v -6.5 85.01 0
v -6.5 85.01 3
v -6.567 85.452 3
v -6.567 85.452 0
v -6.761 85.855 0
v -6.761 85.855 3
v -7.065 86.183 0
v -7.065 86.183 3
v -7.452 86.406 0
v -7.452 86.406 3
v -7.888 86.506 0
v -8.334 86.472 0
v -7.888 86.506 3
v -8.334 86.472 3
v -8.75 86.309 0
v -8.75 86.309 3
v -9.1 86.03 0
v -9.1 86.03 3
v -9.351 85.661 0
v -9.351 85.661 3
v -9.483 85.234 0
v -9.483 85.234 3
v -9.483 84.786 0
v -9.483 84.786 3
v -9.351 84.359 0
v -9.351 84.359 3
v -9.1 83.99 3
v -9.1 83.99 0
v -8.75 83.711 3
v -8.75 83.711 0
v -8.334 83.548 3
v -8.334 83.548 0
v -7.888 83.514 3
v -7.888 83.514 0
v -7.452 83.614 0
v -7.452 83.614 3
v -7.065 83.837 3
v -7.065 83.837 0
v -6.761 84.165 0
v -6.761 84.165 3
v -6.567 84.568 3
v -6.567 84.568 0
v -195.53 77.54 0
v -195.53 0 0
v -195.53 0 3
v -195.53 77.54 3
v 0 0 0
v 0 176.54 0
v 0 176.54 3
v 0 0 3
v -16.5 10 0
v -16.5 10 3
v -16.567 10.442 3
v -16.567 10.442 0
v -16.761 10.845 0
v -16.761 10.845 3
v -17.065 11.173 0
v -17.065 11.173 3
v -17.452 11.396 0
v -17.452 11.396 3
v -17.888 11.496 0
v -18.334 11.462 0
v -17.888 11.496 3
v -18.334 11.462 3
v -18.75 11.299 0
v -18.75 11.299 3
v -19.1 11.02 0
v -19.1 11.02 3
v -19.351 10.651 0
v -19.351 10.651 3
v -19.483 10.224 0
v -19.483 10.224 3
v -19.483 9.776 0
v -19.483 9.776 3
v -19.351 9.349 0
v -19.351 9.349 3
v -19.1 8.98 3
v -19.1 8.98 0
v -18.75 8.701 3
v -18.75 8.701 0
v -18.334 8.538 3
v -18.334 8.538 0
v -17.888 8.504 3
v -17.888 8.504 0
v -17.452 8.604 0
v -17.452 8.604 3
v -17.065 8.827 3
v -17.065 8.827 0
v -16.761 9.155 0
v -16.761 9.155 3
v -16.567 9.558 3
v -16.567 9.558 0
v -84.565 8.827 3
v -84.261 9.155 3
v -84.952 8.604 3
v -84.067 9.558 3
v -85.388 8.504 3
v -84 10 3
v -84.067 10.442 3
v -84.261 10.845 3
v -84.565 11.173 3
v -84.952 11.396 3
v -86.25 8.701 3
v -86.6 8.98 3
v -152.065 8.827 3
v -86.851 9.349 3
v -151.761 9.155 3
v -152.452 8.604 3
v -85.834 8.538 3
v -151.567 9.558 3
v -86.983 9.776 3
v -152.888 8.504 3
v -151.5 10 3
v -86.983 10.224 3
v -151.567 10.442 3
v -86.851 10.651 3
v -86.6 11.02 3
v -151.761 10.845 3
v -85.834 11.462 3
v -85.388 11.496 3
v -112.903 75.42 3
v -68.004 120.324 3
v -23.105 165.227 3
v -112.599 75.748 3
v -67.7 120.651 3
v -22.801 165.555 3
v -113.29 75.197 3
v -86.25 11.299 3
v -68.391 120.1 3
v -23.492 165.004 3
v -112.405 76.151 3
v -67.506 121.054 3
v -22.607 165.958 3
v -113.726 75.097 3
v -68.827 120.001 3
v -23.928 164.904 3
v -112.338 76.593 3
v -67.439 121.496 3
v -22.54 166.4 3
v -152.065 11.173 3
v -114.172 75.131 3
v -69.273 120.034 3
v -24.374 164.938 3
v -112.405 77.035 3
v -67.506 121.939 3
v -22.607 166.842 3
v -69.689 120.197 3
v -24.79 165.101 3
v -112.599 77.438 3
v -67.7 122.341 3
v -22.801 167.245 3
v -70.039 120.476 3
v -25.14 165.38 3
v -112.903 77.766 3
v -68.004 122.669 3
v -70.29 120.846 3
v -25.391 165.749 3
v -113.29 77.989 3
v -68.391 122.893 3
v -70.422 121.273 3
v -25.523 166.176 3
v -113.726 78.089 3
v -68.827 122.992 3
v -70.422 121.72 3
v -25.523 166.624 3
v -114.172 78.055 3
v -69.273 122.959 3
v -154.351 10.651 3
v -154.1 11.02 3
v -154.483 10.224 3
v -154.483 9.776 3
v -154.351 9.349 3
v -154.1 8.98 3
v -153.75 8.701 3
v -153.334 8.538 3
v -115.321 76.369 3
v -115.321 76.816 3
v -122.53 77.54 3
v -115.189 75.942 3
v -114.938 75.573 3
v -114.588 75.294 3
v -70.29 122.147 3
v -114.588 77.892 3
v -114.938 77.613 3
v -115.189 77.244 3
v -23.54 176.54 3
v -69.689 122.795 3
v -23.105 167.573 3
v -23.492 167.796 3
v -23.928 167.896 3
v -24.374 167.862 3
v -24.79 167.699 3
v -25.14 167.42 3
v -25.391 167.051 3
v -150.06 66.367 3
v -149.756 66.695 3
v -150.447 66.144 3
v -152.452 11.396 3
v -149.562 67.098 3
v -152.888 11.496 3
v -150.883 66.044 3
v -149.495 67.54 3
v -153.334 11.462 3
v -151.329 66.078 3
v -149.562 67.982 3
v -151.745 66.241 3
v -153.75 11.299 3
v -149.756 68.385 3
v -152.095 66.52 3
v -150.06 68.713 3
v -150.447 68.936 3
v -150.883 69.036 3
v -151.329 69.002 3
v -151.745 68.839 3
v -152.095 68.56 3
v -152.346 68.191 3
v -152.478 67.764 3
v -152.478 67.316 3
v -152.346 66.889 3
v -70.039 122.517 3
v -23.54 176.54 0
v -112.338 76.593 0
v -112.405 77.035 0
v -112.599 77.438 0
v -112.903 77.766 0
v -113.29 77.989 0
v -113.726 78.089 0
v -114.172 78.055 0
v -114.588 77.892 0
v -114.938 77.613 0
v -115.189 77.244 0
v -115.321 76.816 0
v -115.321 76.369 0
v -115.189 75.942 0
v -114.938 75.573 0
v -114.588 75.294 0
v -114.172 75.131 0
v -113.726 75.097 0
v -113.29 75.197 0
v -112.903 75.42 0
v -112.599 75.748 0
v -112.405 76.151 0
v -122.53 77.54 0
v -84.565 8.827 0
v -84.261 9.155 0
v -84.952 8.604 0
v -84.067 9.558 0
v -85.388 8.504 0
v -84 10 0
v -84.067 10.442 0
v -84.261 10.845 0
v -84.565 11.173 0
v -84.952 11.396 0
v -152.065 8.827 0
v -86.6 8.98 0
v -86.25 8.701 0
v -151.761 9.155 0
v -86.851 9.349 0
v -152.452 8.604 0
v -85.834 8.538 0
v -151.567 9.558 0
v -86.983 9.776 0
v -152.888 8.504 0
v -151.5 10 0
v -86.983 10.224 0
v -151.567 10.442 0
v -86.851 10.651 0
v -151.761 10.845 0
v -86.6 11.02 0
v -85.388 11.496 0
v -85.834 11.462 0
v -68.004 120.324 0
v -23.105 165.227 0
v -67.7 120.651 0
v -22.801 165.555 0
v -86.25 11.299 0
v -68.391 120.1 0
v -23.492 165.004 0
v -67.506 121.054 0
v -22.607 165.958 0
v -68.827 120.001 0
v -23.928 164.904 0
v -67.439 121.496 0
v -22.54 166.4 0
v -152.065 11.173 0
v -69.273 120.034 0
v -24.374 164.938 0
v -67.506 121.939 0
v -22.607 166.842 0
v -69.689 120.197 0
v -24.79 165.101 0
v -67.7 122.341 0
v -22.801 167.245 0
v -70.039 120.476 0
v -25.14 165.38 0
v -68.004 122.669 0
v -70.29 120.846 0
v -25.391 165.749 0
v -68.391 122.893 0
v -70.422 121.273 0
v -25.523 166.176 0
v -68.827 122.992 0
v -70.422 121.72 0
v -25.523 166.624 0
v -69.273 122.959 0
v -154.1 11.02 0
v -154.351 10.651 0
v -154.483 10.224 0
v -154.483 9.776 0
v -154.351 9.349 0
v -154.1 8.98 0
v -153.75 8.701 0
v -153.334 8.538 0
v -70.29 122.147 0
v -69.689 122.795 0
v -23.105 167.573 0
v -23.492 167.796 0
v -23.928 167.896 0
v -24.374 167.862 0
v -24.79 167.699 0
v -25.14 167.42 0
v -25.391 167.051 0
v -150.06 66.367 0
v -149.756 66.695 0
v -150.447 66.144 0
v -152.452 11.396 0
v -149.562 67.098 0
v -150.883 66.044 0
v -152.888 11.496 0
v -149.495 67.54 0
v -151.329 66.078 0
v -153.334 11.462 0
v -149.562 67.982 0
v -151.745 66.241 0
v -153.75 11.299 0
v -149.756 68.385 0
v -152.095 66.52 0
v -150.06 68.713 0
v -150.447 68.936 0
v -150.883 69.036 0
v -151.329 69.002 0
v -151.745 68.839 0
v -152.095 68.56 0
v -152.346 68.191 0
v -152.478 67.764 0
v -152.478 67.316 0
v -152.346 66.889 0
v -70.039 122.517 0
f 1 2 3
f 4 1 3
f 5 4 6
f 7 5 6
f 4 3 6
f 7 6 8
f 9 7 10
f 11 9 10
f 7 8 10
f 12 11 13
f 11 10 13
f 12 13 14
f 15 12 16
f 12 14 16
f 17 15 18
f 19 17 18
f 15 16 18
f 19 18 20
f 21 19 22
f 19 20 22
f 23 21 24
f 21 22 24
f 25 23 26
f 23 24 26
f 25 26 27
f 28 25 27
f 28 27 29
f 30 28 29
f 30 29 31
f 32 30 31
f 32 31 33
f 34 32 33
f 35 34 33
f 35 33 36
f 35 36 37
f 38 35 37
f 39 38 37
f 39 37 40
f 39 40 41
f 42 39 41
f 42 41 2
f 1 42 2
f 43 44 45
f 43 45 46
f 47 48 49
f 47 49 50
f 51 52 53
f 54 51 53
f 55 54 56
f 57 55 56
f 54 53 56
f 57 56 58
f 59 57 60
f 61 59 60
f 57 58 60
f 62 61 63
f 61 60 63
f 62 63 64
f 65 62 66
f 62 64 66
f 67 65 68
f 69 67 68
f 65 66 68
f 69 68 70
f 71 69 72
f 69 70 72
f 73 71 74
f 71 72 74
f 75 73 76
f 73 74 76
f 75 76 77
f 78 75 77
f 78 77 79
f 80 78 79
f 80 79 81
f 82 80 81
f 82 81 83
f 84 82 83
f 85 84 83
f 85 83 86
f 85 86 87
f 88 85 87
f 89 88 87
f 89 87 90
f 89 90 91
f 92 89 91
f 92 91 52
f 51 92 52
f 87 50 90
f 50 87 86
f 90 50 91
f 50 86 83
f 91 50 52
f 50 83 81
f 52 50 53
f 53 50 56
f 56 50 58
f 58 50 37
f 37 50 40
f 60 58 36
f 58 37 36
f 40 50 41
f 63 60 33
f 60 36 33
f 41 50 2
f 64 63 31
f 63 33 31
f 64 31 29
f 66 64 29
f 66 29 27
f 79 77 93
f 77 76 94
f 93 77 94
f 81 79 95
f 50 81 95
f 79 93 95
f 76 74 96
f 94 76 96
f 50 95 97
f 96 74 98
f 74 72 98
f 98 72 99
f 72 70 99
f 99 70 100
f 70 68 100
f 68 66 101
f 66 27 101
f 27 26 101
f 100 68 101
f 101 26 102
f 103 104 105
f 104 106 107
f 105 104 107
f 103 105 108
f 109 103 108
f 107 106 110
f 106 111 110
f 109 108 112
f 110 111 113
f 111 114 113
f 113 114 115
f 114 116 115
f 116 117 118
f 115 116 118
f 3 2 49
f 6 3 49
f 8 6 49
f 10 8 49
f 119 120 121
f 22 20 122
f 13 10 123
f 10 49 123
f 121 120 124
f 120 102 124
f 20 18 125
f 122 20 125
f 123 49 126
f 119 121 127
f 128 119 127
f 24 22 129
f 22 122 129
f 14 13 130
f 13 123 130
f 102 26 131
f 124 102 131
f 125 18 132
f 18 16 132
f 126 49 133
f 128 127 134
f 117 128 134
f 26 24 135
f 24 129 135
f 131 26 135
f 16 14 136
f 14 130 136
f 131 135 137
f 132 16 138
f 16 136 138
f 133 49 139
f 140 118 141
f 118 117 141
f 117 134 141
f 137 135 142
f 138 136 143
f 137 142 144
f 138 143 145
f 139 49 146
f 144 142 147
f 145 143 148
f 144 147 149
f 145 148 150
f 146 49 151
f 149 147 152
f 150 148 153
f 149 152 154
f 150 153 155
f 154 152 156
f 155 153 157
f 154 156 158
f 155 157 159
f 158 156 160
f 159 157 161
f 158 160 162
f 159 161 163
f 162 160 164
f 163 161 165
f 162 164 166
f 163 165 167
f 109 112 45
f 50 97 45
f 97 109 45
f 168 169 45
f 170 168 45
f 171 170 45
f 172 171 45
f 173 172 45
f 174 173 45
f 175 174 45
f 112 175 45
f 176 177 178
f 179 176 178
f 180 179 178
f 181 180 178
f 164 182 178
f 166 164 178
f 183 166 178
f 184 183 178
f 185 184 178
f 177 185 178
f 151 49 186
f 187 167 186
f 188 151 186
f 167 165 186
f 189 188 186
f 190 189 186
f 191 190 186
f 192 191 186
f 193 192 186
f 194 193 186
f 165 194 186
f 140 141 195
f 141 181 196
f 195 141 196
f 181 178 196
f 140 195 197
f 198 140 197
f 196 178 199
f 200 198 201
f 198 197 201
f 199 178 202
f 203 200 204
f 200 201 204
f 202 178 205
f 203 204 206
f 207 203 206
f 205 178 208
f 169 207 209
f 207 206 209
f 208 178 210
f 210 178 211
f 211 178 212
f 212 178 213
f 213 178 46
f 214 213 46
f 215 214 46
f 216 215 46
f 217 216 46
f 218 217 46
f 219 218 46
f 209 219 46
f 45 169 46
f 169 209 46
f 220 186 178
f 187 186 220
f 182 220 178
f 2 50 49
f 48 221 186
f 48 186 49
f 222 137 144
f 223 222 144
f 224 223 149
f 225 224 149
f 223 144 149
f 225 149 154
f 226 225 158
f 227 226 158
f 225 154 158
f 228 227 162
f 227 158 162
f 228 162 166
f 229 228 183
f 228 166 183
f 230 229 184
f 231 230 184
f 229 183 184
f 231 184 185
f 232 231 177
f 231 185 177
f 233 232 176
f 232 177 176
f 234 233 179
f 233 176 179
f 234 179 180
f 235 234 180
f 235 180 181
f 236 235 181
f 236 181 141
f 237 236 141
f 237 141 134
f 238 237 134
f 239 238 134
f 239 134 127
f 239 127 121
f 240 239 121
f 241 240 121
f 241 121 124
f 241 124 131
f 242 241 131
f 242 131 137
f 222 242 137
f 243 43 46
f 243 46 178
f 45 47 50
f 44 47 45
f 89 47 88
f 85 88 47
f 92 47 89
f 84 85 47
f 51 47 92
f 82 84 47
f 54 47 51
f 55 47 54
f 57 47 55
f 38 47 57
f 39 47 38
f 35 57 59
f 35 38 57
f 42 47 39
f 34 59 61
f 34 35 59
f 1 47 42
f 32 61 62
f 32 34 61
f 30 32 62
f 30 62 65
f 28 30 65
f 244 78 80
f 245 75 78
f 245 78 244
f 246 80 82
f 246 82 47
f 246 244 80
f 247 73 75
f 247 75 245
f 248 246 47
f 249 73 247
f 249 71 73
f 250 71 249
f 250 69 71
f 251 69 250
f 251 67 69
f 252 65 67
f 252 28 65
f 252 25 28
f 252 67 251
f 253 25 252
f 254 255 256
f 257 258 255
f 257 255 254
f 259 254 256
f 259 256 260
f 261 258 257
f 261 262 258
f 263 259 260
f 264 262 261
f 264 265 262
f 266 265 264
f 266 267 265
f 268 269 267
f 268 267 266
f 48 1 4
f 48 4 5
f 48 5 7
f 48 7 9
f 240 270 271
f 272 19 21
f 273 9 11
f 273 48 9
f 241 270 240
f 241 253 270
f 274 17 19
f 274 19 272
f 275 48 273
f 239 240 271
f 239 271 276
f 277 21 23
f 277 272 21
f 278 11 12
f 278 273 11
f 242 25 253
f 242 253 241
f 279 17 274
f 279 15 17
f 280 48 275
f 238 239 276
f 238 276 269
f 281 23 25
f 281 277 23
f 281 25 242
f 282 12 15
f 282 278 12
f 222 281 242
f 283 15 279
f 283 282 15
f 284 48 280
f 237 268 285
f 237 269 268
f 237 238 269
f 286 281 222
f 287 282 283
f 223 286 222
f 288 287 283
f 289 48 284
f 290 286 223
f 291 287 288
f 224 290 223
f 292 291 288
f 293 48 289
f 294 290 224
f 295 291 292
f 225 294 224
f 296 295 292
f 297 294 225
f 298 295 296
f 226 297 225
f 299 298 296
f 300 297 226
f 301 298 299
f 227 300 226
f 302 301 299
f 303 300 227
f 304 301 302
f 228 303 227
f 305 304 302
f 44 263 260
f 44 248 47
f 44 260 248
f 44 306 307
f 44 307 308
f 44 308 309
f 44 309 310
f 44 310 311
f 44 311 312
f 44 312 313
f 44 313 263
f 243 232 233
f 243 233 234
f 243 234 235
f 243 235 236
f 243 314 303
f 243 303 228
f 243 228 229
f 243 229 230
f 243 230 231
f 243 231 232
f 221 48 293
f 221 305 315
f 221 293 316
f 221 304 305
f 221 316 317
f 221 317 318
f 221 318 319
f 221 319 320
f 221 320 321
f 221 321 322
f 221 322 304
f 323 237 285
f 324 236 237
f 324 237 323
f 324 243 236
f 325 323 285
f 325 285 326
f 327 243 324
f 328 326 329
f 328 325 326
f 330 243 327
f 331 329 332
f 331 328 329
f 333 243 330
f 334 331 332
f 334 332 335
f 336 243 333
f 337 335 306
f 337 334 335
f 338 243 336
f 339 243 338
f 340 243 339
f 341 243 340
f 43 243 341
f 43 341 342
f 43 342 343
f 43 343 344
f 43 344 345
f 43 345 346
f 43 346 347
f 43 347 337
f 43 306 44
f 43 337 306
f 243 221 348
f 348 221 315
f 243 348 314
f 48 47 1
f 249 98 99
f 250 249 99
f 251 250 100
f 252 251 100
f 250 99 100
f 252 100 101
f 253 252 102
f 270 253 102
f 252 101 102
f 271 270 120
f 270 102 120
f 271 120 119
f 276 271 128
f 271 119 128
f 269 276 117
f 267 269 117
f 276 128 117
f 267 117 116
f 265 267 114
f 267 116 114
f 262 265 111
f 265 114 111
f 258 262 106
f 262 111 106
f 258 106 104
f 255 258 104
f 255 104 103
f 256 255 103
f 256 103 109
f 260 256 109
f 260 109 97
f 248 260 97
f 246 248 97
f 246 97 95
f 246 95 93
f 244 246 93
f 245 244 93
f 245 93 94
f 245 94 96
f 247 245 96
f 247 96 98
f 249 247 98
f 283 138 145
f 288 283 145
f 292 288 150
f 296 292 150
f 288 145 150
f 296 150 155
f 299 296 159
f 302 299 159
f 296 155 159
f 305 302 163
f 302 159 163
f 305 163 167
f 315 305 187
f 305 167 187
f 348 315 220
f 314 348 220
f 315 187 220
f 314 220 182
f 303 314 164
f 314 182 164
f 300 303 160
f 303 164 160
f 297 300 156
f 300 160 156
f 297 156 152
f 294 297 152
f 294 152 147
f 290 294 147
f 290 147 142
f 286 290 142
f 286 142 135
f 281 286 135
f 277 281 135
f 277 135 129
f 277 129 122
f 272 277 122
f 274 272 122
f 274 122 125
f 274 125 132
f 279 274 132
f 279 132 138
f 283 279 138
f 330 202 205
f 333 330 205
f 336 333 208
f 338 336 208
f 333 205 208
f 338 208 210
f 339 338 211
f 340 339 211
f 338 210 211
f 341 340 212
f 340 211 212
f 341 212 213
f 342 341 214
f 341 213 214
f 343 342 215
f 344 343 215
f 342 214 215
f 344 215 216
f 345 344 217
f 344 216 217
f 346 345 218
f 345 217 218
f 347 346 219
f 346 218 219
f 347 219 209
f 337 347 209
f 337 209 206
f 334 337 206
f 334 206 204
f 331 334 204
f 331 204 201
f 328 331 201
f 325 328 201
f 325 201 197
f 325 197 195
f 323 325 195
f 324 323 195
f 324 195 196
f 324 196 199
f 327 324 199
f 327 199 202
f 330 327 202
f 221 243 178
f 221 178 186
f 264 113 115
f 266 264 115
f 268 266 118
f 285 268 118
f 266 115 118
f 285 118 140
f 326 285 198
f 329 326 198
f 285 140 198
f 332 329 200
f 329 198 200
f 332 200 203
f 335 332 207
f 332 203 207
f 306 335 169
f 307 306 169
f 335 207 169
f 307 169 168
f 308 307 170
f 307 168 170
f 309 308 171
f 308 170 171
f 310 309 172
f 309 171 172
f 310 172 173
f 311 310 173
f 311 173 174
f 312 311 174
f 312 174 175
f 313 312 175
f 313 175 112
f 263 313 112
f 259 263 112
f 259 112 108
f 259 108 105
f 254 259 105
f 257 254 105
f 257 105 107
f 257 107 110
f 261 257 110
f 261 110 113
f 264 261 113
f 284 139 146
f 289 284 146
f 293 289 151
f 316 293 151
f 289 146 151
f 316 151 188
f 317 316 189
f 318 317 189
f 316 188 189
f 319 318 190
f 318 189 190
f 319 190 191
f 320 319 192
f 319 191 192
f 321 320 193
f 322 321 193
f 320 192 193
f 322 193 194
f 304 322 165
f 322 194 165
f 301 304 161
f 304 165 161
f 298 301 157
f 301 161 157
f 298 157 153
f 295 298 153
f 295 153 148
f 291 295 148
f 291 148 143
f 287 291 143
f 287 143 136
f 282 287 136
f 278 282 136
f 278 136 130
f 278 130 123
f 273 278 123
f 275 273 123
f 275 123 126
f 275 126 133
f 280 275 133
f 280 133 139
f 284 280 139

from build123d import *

# Parameters (mm, degrees)
BOSS_EXTRUDE1_DEPTH = 3
CUT_EXTRUDE1_REACH  = 265.453
SKETCH2_R           = 1.5
LPATTERN2_COUNT     = 3
LPATTERN2_PITCH     = 63.5
CUT_EXTRUDE2_REACH  = 265.453
SKETCH3_R           = 1.5
CUT_EXTRUDE3_REACH  = 265.453
SKETCH4_R           = 1.5
CUT_EXTRUDE4_REACH  = 265.453
SKETCH5_R           = 1.5


with BuildPart() as part:
    # Sketch1 → Boss-Extrude1 (new body)
    with BuildSketch(Plane.XY):
        Polygon((0, 0), (-195.53, 0), (-195.53, 77.54), (-122.53, 77.54), (-23.54, 176.54), (0, 176.54), align=None)
    extrude(amount=BOSS_EXTRUDE1_DEPTH)

    # Sketch2 → Cut-Extrude1 (cut, up to next)
    with BuildSketch(Plane.XY.offset(3), mode=Mode.PRIVATE) as cut_extrude1_sk1:
        with Locations((-24.04, 166.4)):
            Circle(SKETCH2_R)
    cut_extrude1_tool1 = extrude(cut_extrude1_sk1.sketch, amount=-CUT_EXTRUDE1_REACH, mode=Mode.PRIVATE) & part.part
    cut_extrude1 = cut_extrude1_tool1.solids().sort_by_distance((-24.04, 166.4, 3))[0]
    add(cut_extrude1, mode=Mode.SUBTRACT)

    # LPattern2: Cut-Extrude1 ×3
    with Locations(*[Vector(-0.707071066017225, -0.707142494552028, 0) * (i * LPATTERN2_PITCH) for i in range(1, LPATTERN2_COUNT)]):
        add(cut_extrude1, mode=Mode.SUBTRACT)

    # Sketch3 → Cut-Extrude2 (cut, up to next)
    with BuildSketch(Plane.XY.offset(3), mode=Mode.PRIVATE) as cut_extrude2_sk1:
        with Locations((-18, 10)):
            Circle(SKETCH3_R)
    cut_extrude2_tool1 = extrude(cut_extrude2_sk1.sketch, amount=-CUT_EXTRUDE2_REACH, mode=Mode.PRIVATE) & part.part
    # Sketch3 → Cut-Extrude2 (cut, up to next)
    with BuildSketch(Plane.XY.offset(3), mode=Mode.PRIVATE) as cut_extrude2_sk2:
        with Locations((-85.5, 10)):
            Circle(SKETCH3_R)
    cut_extrude2_tool2 = extrude(cut_extrude2_sk2.sketch, amount=-CUT_EXTRUDE2_REACH, mode=Mode.PRIVATE) & part.part
    # Sketch3 → Cut-Extrude2 (cut, up to next)
    with BuildSketch(Plane.XY.offset(3), mode=Mode.PRIVATE) as cut_extrude2_sk3:
        with Locations((-153, 10)):
            Circle(SKETCH3_R)
    cut_extrude2_tool3 = extrude(cut_extrude2_sk3.sketch, amount=-CUT_EXTRUDE2_REACH, mode=Mode.PRIVATE) & part.part
    add(cut_extrude2_tool1.solids().sort_by_distance((-18, 10, 3))[0], mode=Mode.SUBTRACT)
    add(cut_extrude2_tool2.solids().sort_by_distance((-85.5, 10, 3))[0], mode=Mode.SUBTRACT)
    add(cut_extrude2_tool3.solids().sort_by_distance((-153, 10, 3))[0], mode=Mode.SUBTRACT)

    # Sketch4 → Cut-Extrude3 (cut, up to next)
    with BuildSketch(Plane.XY.offset(3), mode=Mode.PRIVATE) as cut_extrude3_sk1:
        with Locations((-150.995, 67.54)):
            Circle(SKETCH4_R)
    cut_extrude3_tool1 = extrude(cut_extrude3_sk1.sketch, amount=-CUT_EXTRUDE3_REACH, mode=Mode.PRIVATE) & part.part
    add(cut_extrude3_tool1.solids().sort_by_distance((-150.995, 67.54, 3))[0], mode=Mode.SUBTRACT)

    # Sketch5 → Cut-Extrude4 (cut, up to next)
    with BuildSketch(Plane.XY.offset(3), mode=Mode.PRIVATE) as cut_extrude4_sk1:
        with Locations((-8, 85.01)):
            Circle(SKETCH5_R)
    cut_extrude4_tool1 = extrude(cut_extrude4_sk1.sketch, amount=-CUT_EXTRUDE4_REACH, mode=Mode.PRIVATE) & part.part
    add(cut_extrude4_tool1.solids().sort_by_distance((-8, 85.01, 3))[0], mode=Mode.SUBTRACT)


solid = part.part
